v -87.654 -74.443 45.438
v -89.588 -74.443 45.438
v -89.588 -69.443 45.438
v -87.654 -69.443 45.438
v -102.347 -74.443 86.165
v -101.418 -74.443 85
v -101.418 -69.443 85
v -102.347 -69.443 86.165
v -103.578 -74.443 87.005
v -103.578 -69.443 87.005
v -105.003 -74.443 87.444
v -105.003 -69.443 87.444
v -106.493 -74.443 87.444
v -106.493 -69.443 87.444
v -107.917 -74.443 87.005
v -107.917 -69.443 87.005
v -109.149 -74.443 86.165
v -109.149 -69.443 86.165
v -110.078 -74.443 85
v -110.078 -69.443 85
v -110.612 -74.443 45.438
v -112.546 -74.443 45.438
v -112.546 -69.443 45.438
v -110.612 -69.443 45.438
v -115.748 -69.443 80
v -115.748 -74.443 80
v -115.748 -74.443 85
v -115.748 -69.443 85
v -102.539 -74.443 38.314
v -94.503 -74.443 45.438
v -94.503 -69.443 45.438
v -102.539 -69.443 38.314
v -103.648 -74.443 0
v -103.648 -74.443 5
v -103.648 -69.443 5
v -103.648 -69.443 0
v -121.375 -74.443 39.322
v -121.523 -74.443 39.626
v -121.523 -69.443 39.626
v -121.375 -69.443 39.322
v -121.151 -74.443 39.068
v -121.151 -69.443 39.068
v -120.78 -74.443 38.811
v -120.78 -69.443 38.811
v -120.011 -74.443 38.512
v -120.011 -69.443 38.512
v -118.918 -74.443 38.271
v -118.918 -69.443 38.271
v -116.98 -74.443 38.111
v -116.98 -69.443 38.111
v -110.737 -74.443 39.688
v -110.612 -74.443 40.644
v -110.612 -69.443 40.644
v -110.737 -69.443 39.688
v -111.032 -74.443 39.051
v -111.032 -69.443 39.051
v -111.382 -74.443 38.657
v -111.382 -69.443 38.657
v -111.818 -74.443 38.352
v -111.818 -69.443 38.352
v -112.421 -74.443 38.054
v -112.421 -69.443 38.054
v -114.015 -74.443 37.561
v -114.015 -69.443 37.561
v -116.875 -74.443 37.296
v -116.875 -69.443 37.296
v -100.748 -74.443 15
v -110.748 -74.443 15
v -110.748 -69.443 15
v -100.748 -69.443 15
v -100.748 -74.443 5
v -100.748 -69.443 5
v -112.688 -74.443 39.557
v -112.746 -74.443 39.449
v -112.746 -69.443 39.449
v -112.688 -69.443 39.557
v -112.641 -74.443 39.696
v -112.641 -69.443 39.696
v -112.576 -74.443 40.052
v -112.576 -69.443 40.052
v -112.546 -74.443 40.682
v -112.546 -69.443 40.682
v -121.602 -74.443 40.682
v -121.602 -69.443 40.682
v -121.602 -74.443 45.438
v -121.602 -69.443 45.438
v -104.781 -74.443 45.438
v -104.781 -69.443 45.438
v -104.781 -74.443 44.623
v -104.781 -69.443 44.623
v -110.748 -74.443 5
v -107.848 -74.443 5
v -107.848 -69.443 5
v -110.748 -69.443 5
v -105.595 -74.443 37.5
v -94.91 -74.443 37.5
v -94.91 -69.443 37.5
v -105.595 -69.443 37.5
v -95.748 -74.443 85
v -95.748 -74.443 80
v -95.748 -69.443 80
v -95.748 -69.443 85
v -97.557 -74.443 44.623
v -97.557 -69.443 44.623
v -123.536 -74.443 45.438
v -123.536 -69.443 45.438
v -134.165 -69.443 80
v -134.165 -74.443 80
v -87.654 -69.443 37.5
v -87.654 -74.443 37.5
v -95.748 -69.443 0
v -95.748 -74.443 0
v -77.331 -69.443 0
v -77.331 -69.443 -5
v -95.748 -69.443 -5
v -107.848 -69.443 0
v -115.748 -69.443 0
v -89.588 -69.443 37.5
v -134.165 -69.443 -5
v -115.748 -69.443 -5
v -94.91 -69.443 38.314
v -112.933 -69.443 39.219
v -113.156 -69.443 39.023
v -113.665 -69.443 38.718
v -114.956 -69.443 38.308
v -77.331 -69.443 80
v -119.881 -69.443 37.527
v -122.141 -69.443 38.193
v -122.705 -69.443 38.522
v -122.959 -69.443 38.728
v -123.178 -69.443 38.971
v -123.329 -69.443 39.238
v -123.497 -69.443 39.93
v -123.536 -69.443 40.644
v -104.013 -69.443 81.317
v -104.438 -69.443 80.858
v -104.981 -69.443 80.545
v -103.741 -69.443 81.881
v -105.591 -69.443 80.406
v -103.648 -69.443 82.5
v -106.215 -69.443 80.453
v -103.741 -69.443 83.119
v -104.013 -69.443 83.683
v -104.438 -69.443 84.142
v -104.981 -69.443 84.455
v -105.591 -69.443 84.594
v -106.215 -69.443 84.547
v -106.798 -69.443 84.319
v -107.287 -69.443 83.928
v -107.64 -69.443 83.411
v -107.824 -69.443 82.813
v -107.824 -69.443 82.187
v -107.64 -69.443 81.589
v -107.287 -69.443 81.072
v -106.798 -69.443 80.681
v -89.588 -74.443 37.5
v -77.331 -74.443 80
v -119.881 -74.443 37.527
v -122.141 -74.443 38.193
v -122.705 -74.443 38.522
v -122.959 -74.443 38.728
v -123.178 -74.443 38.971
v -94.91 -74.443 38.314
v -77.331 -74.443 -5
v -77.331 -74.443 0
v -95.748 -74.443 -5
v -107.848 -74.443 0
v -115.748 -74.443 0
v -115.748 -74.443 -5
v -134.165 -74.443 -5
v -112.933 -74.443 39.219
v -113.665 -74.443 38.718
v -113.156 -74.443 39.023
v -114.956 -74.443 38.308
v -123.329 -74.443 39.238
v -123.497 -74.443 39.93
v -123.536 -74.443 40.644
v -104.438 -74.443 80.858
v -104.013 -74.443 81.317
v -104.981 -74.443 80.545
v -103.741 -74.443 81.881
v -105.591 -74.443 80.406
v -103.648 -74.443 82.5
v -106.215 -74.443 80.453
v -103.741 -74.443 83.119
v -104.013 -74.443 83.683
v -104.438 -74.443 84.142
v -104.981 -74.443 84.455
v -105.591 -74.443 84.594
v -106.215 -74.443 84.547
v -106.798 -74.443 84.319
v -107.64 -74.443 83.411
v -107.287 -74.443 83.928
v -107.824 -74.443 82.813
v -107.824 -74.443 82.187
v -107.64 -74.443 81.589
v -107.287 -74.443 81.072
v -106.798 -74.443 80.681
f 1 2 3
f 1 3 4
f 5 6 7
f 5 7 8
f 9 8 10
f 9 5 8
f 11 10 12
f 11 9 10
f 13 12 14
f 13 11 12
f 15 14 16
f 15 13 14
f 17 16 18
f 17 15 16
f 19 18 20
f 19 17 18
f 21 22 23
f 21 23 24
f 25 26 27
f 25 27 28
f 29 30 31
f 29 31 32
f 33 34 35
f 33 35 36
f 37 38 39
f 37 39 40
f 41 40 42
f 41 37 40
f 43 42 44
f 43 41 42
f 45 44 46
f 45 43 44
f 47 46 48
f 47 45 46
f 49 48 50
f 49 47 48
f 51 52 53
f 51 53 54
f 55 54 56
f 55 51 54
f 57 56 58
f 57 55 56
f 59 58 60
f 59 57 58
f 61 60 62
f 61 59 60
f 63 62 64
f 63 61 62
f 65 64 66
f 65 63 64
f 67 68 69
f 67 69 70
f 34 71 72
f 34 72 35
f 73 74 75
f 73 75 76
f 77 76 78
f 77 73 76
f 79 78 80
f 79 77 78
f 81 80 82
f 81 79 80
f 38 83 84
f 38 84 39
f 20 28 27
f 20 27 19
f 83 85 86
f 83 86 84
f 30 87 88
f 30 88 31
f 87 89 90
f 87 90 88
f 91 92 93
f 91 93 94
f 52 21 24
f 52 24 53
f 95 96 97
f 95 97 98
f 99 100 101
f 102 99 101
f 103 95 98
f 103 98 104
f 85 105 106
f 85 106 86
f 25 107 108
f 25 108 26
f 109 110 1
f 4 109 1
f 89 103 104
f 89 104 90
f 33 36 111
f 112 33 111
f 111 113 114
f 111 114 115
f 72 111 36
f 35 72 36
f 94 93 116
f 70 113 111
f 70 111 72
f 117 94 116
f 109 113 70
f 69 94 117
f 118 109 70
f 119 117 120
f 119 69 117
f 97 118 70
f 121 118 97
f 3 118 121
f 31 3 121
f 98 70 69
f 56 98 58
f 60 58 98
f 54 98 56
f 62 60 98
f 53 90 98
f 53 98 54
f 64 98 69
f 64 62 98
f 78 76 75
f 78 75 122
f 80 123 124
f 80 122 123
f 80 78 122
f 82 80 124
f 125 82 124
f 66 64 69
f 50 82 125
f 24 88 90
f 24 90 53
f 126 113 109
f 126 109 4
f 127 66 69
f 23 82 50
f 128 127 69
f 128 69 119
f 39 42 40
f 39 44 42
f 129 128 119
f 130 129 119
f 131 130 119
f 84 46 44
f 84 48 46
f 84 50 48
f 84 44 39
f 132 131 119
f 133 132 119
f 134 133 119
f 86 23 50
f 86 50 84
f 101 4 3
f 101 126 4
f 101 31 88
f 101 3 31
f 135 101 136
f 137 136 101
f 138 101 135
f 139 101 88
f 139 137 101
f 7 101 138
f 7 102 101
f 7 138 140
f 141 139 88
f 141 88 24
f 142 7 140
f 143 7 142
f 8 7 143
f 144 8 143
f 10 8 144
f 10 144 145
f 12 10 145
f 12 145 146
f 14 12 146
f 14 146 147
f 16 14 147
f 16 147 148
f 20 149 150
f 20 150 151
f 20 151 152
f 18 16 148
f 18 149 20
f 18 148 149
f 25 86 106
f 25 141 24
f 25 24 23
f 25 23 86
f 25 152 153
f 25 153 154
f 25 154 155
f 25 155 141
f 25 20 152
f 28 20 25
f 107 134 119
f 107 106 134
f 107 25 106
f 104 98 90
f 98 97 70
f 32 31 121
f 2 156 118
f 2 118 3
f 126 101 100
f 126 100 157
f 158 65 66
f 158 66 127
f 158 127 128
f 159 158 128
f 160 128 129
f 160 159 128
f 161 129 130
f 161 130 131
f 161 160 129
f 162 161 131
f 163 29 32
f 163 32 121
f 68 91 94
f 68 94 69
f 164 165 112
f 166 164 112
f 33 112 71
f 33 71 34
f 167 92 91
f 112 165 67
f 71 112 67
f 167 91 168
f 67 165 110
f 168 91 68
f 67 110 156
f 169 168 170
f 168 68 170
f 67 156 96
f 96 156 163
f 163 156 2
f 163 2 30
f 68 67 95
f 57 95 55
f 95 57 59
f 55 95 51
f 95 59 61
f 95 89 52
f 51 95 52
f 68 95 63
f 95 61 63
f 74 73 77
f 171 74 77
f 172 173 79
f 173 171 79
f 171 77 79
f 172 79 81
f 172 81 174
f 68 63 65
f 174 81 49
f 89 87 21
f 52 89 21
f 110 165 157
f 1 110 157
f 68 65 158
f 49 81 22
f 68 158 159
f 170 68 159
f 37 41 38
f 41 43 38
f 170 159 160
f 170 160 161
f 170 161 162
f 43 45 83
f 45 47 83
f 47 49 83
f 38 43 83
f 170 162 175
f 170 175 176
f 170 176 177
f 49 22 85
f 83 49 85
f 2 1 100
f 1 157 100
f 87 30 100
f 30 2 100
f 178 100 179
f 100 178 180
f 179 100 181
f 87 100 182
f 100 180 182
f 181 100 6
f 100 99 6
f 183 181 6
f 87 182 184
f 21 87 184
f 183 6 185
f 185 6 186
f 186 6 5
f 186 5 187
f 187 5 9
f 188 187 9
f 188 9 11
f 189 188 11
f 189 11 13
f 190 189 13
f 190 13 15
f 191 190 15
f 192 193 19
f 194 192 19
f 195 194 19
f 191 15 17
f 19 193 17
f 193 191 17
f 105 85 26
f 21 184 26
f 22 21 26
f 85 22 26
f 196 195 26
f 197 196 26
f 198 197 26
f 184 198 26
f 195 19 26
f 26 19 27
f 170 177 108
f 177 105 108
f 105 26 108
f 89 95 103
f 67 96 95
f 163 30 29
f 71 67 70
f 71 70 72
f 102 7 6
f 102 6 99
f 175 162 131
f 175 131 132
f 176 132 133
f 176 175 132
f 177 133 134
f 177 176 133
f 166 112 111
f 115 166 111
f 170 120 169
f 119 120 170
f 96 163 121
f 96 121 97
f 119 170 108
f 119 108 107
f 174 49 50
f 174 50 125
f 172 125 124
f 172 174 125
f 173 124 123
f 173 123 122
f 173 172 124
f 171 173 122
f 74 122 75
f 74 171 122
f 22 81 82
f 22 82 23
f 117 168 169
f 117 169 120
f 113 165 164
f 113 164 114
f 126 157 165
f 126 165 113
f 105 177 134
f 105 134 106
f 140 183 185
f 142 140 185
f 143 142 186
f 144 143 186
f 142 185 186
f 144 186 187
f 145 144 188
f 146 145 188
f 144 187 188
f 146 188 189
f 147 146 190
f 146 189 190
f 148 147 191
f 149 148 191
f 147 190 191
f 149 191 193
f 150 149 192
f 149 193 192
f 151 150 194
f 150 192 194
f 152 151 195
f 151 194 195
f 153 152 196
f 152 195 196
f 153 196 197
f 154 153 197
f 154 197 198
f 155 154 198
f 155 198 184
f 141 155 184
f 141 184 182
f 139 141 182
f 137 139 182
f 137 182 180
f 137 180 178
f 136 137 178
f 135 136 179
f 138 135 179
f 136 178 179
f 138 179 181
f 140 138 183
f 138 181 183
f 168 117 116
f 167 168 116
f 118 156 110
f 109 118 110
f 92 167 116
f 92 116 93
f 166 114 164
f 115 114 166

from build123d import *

# Parameters (mm, degrees)
SKETCH1_W           = 56.833752097
SKETCH1_H           = 5
BOSS_EXTRUDE1_DEPTH = 80
SKETCH2_W           = 18.416876048
SKETCH2_H           = 5
SKETCH2_W_2         = 18.416876049
BOSS_EXTRUDE2_DEPTH = 5
SKETCH3_W           = 20
SKETCH3_H           = 5
BOSS_EXTRUDE3_DEPTH = 5
CUT_EXTRUDE1_DEPTH  = 5
BOSS_EXTRUDE4_DEPTH = 5
SKETCH6_R           = 2.1
CUT_EXTRUDE2_DEPTH  = 5
SKETCH8_W           = 1.93349359
SKETCH8_H           = 7.9375
CUT_EXTRUDE3_DEPTH  = 5


with BuildPart() as part:
    # Sketch1 → Boss-Extrude1 (new body)
    with BuildSketch(Plane.XY):
        with Locations((-105.747769379, -71.943096951)):
            Rectangle(SKETCH1_W, SKETCH1_H)
    extrude(amount=BOSS_EXTRUDE1_DEPTH)

    # Sketch2 → Boss-Extrude2 (add)
    with BuildSketch(Plane(origin=(0, 0, 0), x_dir=(-1, 0, 0), z_dir=(0, 0, -1))):
        with Locations((86.539331354, -71.943096951)):
            Rectangle(SKETCH2_W, SKETCH2_H)
        with Locations((124.956207403, -71.943096951)):
            Rectangle(SKETCH2_W_2, SKETCH2_H)
    extrude(amount=BOSS_EXTRUDE2_DEPTH)

    # Sketch3 → Boss-Extrude3 (add)
    with BuildSketch(Plane.XY.offset(80)):
        with Locations((-105.747769378, -71.943096951)):
            Rectangle(SKETCH3_W, SKETCH3_H)
    extrude(amount=BOSS_EXTRUDE3_DEPTH)

    # Sketch4 → Cut-Extrude1 (cut)
    with BuildSketch(Plane.XZ.offset(74.443096951)):
        Polygon((-107.847769378, 0), (-107.847769378, 5), (-110.747769378, 5), (-110.747769378, 15), (-100.747769378, 15), (-100.747769378, 5), (-103.647769378, 5), (-103.647769378, 0), align=None)
    extrude(amount=-CUT_EXTRUDE1_DEPTH, mode=Mode.SUBTRACT)

    # Sketch5 → Boss-Extrude4 (add)
    with BuildSketch(Plane.XZ.offset(74.443096951)):
        with BuildLine():
            Line((-110.077896397, 85), (-101.417642359, 85))
            ThreePointArc((-101.417642359, 85), (-105.747769378, 87.5), (-110.077896397, 85))
        make_face()
    extrude(amount=-BOSS_EXTRUDE4_DEPTH)

    # Sketch6 → Cut-Extrude2 (cut)
    with BuildSketch(Plane.XZ.offset(74.443096951)):
        with Locations((-105.747769378, 82.5)):
            Circle(SKETCH6_R)
    extrude(amount=-CUT_EXTRUDE2_DEPTH, mode=Mode.SUBTRACT)

    # Sketch8 → Cut-Extrude3 (cut)
    with BuildSketch(Plane.XZ.offset(74.443096951)):
        with BuildLine():
            Line((-123.535910404, 45.4375), (-121.602416814, 45.4375))
            Line((-121.602416814, 45.4375), (-121.602416814, 40.681678185))
            add(Edge.make_bspline(
                [(-121.602416814, 40.681678185), (-121.601990048, 40.614365441), (-121.601180152, 40.486622809), (-121.598439266, 40.304791606), (-121.592462111, 40.143061597), (-121.582649953, 40.001032923), (-121.57194051, 39.879023265), (-121.55953718, 39.776587793), (-121.545409362, 39.693656046), (-121.529735909, 39.646438596), (-121.522914611, 39.625888922)],
                knots=[0, 0, 0, 0, 0.000201942, 0.000383235, 0.000545544, 0.000687379, 0.000810317, 0.000912872, 0.000997069, 0.00106195, 0.00106195, 0.00106195, 0.00106195], degree=3))
            add(Edge.make_bspline(
                [(-121.522914611, 39.625888922), (-121.509452841, 39.587377666), (-121.482681561, 39.510790729), (-121.426995401, 39.4013048), (-121.360408578, 39.295994704), (-121.28006619, 39.19616361), (-121.189648325, 39.099739524), (-121.084644905, 39.011371702), (-120.970198973, 38.924768446), (-120.841762659, 38.843010088), (-120.697710316, 38.767120374), (-120.537215044, 38.693859228), (-120.359436668, 38.621836124), (-120.162385483, 38.55659879), (-119.948353328, 38.492219896), (-119.716163536, 38.433044528), (-119.466897465, 38.373285603), (-119.110484454, 38.302421294), (-118.652583447, 38.225640947), (-118.096617037, 38.158746344), (-117.538892715, 38.117643369), (-117.166262368, 38.112930622), (-116.980158701, 38.110576923)],
                knots=[0, 0, 0, 0, 0.000122268, 0.000243153, 0.000367543, 0.00049543, 0.00062702, 0.00076344, 0.000906544, 0.001057397, 0.001219582, 0.001394602, 0.001586524, 0.001794692, 0.002017049, 0.002256929, 0.002513405, 0.002785948, 0.003346916, 0.003905845, 0.004465364, 0.005023615, 0.005023615, 0.005023615, 0.005023615], degree=3))
            add(Edge.make_bspline(
                [(-116.980158701, 38.110576923), (-116.820057773, 38.113012249), (-116.502227103, 38.117846831), (-116.03087379, 38.147408488), (-115.569601956, 38.201435841), (-115.122201733, 38.270116147), (-114.698159331, 38.362899945), (-114.30504593, 38.466328223), (-113.950231341, 38.591770142), (-113.631201908, 38.728435362), (-113.34875012, 38.881571653), (-113.10835998, 39.053804153), (-112.902793753, 39.238379234), (-112.797305407, 39.38023024), (-112.745871341, 39.44939403)],
                knots=[0, 0, 0, 0, 0.000480322, 0.000953531, 0.00141604, 0.001873246, 0.002310797, 0.00271773, 0.003091874, 0.003438668, 0.003758203, 0.004053391, 0.004324543, 0.004582552, 0.004582552, 0.004582552, 0.004582552], degree=3))
            add(Edge.make_bspline(
                [(-112.745871341, 39.44939403), (-112.729005179, 39.477013683), (-112.692593547, 39.536640564), (-112.655395728, 39.644154214), (-112.620539489, 39.768801799), (-112.591731131, 39.913330101), (-112.572660575, 40.077680361), (-112.556459045, 40.261639349), (-112.547195392, 40.4653388), (-112.546098513, 40.607467269), (-112.545525789, 40.681678185)],
                knots=[0, 0, 0, 0, 9.6836e-05, 0.000209055, 0.000339449, 0.000485387, 0.000650461, 0.00083559, 0.001039339, 0.001261968, 0.001261968, 0.001261968, 0.001261968], degree=3))
            Line((-112.545525789, 40.681678185), (-112.545525789, 45.4375))
            Line((-112.545525789, 45.4375), (-110.612032199, 45.4375))
            Line((-110.612032199, 45.4375), (-110.612032199, 40.643517127))
            add(Edge.make_bspline(
                [(-110.612032199, 40.643517127), (-110.613477985, 40.557066925), (-110.616304371, 40.388064256), (-110.640769365, 40.140467174), (-110.679895535, 39.905487365), (-110.735004886, 39.682744005), (-110.809098914, 39.474292467), (-110.896164276, 39.27658251), (-111.0014758, 39.092896663), (-111.122090727, 38.918520772), (-111.268585123, 38.754239806), (-111.446943017, 38.599798583), (-111.654606494, 38.447346515), (-111.896614725, 38.305011699), (-112.166840551, 38.161605162), (-112.472452702, 38.030539583), (-112.807571473, 37.899478019), (-113.173034335, 37.776537822), (-113.564411059, 37.663960183), (-113.977877444, 37.566073163), (-114.411114346, 37.481431072), (-114.864742005, 37.413412032), (-115.339029089, 37.361729677), (-115.833216674, 37.323441827), (-116.347647026, 37.301283236), (-116.697109796, 37.298097825), (-116.875215793, 37.296474359)],
                knots=[0, 0, 0, 0, 0.000259299, 0.000506907, 0.000745568, 0.000973483, 0.001194247, 0.001408484, 0.001620694, 0.001828461, 0.002043564, 0.002279004, 0.00253502, 0.002815347, 0.003120457, 0.003452228, 0.003812172, 0.004199846, 0.00460849, 0.005033493, 0.005474119, 0.005932411, 0.00640914, 0.006905114, 0.007419181, 0.007953495, 0.007953495, 0.007953495, 0.007953495], degree=3))
            add(Edge.make_bspline(
                [(-116.875215793, 37.296474359), (-117.06868425, 37.298263057), (-117.448310552, 37.301772862), (-118.007268603, 37.321598277), (-118.54476417, 37.359249175), (-119.061557452, 37.406637359), (-119.556559089, 37.473190008), (-120.031185303, 37.549344646), (-120.484280367, 37.644235623), (-120.914952743, 37.748913991), (-121.317062778, 37.867570667), (-121.686773306, 37.99560829), (-122.022012304, 38.133781626), (-122.322535304, 38.280698867), (-122.589545148, 38.436491218), (-122.820107968, 38.603041936), (-123.018555474, 38.777795338), (-123.126131339, 38.907884929), (-123.178150488, 38.970790765)],
                knots=[0, 0, 0, 0, 0.000580421, 0.001138909, 0.001677586, 0.002196696, 0.002695479, 0.003175675, 0.003638446, 0.004083865, 0.004504975, 0.004895702, 0.005257132, 0.005592062, 0.005898574, 0.006183231, 0.006444425, 0.006688987, 0.006688987, 0.006688987, 0.006688987], degree=3))
            add(Edge.make_bspline(
                [(-123.178150488, 38.970790765), (-123.207601979, 39.012390462), (-123.269314795, 39.099558693), (-123.338519525, 39.254004353), (-123.400520367, 39.428804251), (-123.451403362, 39.627250965), (-123.487616881, 39.848734436), (-123.517131787, 40.092676277), (-123.531645378, 40.360316763), (-123.534449497, 40.546512034), (-123.535910404, 40.643517127)],
                knots=[0, 0, 0, 0, 0.000152586, 0.00031973, 0.000505303, 0.000708928, 0.000933214, 0.001178169, 0.001445769, 0.001736816, 0.001736816, 0.001736816, 0.001736816], degree=3))
            Line((-123.535910404, 40.643517127), (-123.535910404, 45.4375))
        make_face()
        Polygon((-104.781022583, 44.623397436), (-104.781022583, 45.4375), (-94.502977712, 45.4375), (-102.539060444, 38.314102564), (-94.910028994, 38.314102564), (-94.910028994, 37.5), (-105.595125148, 37.5), (-97.557452371, 44.623397436), align=None)
        with Locations((-88.621086686, 41.46875)):
            Rectangle(SKETCH8_W, SKETCH8_H)
    extrude(amount=-CUT_EXTRUDE3_DEPTH, mode=Mode.SUBTRACT)


solid = part.part
